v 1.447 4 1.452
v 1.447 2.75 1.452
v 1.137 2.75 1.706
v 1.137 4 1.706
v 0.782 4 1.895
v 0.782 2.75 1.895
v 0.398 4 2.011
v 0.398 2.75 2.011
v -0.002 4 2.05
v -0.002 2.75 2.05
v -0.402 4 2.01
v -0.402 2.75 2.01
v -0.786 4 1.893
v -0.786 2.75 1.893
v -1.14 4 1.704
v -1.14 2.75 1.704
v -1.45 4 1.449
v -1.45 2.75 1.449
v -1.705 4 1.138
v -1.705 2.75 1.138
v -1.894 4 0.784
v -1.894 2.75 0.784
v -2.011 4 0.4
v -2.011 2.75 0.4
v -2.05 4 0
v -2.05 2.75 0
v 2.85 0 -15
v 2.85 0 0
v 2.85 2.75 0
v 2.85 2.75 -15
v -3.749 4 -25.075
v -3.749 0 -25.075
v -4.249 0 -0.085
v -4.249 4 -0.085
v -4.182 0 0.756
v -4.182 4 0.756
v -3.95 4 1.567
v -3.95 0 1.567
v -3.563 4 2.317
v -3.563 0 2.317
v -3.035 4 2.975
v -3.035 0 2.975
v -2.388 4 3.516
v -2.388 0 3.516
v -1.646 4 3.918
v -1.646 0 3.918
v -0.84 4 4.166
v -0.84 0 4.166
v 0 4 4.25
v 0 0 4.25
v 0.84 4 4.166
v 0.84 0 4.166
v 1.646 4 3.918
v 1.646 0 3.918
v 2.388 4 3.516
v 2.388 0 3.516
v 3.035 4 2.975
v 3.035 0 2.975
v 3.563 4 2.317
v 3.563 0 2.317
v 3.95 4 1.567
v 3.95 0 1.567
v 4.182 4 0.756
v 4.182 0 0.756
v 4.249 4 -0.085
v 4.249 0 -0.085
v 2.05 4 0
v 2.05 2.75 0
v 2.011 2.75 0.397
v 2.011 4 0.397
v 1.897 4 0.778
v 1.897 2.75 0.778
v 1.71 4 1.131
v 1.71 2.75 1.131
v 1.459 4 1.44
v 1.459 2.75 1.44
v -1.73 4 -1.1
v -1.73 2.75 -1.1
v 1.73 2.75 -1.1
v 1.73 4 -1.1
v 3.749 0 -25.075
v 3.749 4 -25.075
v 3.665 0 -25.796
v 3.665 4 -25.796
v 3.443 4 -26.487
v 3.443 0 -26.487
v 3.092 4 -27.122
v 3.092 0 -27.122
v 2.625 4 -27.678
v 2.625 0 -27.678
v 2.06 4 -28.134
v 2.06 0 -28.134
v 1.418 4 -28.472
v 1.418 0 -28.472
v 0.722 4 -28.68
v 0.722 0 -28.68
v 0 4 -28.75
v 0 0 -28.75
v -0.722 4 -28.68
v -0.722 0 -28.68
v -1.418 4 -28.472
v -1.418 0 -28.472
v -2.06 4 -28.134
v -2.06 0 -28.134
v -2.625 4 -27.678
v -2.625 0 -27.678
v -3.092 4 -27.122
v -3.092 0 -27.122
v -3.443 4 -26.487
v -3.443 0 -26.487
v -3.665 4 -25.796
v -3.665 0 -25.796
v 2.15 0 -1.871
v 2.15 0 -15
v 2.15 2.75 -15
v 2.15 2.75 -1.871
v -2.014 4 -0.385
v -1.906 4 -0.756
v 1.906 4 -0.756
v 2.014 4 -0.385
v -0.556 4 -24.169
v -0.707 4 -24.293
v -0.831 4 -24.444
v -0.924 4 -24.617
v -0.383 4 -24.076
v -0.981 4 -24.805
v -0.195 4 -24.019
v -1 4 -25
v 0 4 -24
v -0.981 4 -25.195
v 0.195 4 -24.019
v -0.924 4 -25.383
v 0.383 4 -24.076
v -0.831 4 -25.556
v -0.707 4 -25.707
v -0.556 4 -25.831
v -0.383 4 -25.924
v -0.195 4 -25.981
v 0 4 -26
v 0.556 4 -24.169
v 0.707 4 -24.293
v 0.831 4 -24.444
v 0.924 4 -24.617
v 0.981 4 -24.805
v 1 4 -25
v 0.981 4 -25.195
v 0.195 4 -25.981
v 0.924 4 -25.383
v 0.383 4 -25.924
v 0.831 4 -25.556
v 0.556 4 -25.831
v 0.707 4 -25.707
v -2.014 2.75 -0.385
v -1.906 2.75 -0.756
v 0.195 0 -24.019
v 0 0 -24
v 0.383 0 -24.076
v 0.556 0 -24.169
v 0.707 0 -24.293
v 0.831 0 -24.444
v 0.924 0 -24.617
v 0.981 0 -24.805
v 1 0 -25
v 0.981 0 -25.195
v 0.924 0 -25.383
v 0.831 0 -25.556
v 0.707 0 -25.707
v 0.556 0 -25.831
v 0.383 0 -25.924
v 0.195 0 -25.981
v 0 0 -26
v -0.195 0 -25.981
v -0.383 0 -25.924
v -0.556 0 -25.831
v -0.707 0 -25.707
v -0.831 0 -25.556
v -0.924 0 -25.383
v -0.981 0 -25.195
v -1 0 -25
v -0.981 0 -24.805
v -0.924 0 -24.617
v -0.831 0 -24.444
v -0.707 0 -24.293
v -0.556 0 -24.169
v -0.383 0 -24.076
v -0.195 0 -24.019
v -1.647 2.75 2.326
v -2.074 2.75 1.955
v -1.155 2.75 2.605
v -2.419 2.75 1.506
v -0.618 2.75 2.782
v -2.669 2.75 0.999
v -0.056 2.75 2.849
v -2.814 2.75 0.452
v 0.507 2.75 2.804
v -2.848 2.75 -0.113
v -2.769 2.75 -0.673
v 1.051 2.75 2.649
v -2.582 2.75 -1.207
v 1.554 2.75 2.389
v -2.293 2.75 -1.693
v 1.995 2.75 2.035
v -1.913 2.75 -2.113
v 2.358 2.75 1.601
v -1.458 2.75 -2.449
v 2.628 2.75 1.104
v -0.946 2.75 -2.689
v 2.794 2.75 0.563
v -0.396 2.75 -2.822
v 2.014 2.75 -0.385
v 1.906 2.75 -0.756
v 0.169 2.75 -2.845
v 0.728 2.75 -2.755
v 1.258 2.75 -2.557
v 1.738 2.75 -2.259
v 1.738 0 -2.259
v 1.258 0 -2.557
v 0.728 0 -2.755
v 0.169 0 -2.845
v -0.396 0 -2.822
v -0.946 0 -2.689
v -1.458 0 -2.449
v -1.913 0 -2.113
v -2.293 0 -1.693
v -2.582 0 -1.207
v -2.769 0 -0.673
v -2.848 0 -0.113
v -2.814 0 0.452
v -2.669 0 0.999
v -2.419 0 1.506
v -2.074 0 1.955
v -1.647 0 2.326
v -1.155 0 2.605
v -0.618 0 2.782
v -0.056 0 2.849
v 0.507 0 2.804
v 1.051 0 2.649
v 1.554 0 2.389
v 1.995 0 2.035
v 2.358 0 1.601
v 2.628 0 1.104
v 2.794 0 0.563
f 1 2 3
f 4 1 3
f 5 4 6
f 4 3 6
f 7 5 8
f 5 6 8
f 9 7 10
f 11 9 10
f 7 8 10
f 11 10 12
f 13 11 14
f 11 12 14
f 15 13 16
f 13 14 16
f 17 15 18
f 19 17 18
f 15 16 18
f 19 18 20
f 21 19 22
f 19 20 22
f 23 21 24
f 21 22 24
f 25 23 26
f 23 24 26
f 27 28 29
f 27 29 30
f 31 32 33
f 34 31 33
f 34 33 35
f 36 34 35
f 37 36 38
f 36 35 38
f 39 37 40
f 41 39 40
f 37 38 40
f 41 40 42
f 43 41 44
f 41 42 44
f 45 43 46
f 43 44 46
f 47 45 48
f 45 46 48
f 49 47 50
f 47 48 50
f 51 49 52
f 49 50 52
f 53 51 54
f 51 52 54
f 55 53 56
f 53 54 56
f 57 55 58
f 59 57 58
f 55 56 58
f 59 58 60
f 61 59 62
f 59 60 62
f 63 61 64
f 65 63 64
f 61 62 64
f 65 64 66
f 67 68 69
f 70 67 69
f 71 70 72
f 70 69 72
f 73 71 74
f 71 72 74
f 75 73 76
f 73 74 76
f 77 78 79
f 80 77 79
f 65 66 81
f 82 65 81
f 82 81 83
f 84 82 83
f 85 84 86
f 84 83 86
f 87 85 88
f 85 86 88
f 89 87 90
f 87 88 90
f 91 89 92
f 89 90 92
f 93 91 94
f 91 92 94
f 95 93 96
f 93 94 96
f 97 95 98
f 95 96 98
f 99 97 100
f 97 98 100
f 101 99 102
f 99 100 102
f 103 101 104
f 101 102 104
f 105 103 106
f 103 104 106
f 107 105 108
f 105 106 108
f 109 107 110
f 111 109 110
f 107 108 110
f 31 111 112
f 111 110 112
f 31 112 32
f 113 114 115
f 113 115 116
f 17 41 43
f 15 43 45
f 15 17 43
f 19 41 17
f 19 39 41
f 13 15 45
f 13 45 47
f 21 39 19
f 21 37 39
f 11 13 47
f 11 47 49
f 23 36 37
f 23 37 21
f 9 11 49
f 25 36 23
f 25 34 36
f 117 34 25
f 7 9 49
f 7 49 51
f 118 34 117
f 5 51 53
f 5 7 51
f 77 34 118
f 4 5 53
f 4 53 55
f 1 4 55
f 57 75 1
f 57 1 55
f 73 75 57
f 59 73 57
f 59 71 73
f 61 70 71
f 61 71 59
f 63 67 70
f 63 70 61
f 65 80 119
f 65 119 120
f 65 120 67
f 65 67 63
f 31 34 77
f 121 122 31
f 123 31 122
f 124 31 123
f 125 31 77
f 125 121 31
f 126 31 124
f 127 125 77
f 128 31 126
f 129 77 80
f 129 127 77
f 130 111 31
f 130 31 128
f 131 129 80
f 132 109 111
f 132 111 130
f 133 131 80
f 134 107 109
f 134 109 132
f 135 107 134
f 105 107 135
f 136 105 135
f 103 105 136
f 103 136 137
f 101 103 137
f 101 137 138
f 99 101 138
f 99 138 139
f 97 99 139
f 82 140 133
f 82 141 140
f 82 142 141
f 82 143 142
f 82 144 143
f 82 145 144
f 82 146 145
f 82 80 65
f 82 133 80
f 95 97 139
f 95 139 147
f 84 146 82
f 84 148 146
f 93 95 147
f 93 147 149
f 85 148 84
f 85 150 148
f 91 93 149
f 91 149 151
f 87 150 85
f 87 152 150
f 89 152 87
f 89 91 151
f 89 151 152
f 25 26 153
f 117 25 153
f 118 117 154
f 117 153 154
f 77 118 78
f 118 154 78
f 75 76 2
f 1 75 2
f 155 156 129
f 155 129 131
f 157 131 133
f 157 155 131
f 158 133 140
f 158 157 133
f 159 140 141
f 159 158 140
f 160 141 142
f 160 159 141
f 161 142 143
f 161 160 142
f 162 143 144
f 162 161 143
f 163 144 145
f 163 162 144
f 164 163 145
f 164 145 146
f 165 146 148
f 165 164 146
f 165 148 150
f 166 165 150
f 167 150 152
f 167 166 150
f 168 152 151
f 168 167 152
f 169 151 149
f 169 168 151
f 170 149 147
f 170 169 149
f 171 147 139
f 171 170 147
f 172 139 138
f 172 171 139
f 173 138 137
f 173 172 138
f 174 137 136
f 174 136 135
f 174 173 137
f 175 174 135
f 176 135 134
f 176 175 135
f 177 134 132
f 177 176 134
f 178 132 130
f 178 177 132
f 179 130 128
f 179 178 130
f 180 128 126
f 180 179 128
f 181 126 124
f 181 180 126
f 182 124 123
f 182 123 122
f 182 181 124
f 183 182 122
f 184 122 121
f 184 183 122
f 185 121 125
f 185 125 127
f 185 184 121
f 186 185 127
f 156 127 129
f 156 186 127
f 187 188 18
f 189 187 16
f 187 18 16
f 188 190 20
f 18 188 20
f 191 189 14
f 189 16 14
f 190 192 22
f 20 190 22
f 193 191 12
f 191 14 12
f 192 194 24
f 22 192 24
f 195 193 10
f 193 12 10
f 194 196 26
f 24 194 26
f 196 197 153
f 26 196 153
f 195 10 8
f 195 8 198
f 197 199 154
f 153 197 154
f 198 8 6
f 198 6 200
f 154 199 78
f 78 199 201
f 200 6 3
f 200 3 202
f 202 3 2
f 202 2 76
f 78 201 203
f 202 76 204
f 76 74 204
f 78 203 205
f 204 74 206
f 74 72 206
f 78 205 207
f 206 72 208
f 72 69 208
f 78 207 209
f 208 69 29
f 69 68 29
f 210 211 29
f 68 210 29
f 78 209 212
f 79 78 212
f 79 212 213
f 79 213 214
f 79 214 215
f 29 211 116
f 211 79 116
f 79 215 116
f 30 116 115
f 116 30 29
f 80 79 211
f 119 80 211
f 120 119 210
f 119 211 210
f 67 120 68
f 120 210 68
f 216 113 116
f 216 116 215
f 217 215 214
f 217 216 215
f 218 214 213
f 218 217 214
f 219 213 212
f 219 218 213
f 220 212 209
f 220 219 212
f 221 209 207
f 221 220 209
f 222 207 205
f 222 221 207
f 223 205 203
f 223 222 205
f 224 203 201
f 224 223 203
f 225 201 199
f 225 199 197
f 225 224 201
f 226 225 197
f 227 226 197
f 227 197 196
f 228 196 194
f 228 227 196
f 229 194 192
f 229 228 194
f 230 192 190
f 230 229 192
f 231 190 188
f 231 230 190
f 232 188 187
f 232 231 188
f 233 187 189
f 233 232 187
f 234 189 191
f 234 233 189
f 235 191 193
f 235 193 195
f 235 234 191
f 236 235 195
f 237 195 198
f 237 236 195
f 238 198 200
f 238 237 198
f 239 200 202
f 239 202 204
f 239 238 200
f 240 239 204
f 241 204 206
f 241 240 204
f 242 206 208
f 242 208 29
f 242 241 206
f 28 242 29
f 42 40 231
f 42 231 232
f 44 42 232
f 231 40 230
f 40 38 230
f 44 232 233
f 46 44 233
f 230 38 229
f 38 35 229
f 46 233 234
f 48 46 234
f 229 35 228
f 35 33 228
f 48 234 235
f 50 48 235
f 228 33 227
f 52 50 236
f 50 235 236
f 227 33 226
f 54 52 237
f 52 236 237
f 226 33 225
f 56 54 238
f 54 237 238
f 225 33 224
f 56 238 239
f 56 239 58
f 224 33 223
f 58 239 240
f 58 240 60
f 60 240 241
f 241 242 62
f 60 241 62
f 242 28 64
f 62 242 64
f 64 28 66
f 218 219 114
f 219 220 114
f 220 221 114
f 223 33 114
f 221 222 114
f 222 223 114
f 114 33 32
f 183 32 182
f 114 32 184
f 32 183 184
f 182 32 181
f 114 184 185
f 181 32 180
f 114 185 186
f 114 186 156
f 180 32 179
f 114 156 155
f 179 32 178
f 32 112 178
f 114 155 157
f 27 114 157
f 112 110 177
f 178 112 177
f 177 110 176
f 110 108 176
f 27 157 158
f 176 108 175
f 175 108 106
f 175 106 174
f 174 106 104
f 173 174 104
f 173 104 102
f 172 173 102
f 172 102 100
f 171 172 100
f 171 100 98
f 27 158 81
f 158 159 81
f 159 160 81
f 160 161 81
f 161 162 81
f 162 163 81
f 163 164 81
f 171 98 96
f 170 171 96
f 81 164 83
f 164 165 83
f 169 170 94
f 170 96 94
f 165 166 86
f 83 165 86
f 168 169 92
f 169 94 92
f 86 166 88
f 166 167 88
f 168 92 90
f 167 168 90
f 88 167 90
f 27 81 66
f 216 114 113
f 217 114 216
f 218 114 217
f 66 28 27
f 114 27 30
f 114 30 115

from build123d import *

# Parameters (mm, degrees)
SKETCH1_R           = 1
BOSS_EXTRUDE1_DEPTH = 4
CUT_EXTRUDE1_DEPTH  = 2.75
CUT_EXTRUDE4_DEPTH  = 10


with BuildPart() as part:
    # Sketch1 → Boss-Extrude1 (new body)
    with BuildSketch(Plane(origin=(0, 0, 0), x_dir=(1, 0, 0), z_dir=(0, 1, 0))):
        with BuildLine():
            Line((-3.749249925, 25.075), (-4.249149915, 0.085))
            ThreePointArc((-4.249149915, 0.085), (0, -4.25), (4.249149915, 0.085))
            Line((4.249149915, 0.085), (3.749249925, 25.075))
            ThreePointArc((3.749249925, 25.075), (0, 28.75), (-3.749249925, 25.075))
        make_face()
        with Locations((0, 25)):
            Circle(SKETCH1_R, mode=Mode.SUBTRACT)
    extrude(amount=BOSS_EXTRUDE1_DEPTH)

    # Sketch2 → Cut-Extrude1 (cut)
    with BuildSketch(Plane(origin=(0, 0, 0), x_dir=(1, 0, 0), z_dir=(0, 1, 0))):
        with BuildLine():
            ThreePointArc((2.15, 1.870828693), (-2.669269563, -0.998749218), (2.85, 0))
            ThreePointArc((2.85, 0), (2.669269563, 0.998749218), (2.15, 1.870828693))
        make_face()
        with BuildLine():
            ThreePointArc((2.15, 1.870828693), (2.669269563, 0.998749218), (2.85, 0))
            Line((2.85, 0), (2.85, 15))
            Line((2.85, 15), (2.15, 15))
            Line((2.15, 15), (2.15, 1.870828693))
        make_face()
    extrude(amount=CUT_EXTRUDE1_DEPTH, mode=Mode.SUBTRACT)

    # Sketch4 → Cut-Extrude4 (cut)
    with BuildSketch(Plane.XZ.offset(-2.75)):
        with BuildLine():
            Line((1.459053249, 1.440022089), (1.447376313, 1.451758179))
            ThreePointArc((1.447376313, 1.451758179), (-1.283674473, 1.598336587), (-1.729884389, -1.1))
            Line((-1.729884389, -1.1), (1.729884389, -1.1))
            ThreePointArc((1.729884389, -1.1), (2.038445209, 0.217350252), (1.459053249, 1.440022089))
        make_face()
    extrude(amount=-CUT_EXTRUDE4_DEPTH, mode=Mode.SUBTRACT)


solid = part.part
